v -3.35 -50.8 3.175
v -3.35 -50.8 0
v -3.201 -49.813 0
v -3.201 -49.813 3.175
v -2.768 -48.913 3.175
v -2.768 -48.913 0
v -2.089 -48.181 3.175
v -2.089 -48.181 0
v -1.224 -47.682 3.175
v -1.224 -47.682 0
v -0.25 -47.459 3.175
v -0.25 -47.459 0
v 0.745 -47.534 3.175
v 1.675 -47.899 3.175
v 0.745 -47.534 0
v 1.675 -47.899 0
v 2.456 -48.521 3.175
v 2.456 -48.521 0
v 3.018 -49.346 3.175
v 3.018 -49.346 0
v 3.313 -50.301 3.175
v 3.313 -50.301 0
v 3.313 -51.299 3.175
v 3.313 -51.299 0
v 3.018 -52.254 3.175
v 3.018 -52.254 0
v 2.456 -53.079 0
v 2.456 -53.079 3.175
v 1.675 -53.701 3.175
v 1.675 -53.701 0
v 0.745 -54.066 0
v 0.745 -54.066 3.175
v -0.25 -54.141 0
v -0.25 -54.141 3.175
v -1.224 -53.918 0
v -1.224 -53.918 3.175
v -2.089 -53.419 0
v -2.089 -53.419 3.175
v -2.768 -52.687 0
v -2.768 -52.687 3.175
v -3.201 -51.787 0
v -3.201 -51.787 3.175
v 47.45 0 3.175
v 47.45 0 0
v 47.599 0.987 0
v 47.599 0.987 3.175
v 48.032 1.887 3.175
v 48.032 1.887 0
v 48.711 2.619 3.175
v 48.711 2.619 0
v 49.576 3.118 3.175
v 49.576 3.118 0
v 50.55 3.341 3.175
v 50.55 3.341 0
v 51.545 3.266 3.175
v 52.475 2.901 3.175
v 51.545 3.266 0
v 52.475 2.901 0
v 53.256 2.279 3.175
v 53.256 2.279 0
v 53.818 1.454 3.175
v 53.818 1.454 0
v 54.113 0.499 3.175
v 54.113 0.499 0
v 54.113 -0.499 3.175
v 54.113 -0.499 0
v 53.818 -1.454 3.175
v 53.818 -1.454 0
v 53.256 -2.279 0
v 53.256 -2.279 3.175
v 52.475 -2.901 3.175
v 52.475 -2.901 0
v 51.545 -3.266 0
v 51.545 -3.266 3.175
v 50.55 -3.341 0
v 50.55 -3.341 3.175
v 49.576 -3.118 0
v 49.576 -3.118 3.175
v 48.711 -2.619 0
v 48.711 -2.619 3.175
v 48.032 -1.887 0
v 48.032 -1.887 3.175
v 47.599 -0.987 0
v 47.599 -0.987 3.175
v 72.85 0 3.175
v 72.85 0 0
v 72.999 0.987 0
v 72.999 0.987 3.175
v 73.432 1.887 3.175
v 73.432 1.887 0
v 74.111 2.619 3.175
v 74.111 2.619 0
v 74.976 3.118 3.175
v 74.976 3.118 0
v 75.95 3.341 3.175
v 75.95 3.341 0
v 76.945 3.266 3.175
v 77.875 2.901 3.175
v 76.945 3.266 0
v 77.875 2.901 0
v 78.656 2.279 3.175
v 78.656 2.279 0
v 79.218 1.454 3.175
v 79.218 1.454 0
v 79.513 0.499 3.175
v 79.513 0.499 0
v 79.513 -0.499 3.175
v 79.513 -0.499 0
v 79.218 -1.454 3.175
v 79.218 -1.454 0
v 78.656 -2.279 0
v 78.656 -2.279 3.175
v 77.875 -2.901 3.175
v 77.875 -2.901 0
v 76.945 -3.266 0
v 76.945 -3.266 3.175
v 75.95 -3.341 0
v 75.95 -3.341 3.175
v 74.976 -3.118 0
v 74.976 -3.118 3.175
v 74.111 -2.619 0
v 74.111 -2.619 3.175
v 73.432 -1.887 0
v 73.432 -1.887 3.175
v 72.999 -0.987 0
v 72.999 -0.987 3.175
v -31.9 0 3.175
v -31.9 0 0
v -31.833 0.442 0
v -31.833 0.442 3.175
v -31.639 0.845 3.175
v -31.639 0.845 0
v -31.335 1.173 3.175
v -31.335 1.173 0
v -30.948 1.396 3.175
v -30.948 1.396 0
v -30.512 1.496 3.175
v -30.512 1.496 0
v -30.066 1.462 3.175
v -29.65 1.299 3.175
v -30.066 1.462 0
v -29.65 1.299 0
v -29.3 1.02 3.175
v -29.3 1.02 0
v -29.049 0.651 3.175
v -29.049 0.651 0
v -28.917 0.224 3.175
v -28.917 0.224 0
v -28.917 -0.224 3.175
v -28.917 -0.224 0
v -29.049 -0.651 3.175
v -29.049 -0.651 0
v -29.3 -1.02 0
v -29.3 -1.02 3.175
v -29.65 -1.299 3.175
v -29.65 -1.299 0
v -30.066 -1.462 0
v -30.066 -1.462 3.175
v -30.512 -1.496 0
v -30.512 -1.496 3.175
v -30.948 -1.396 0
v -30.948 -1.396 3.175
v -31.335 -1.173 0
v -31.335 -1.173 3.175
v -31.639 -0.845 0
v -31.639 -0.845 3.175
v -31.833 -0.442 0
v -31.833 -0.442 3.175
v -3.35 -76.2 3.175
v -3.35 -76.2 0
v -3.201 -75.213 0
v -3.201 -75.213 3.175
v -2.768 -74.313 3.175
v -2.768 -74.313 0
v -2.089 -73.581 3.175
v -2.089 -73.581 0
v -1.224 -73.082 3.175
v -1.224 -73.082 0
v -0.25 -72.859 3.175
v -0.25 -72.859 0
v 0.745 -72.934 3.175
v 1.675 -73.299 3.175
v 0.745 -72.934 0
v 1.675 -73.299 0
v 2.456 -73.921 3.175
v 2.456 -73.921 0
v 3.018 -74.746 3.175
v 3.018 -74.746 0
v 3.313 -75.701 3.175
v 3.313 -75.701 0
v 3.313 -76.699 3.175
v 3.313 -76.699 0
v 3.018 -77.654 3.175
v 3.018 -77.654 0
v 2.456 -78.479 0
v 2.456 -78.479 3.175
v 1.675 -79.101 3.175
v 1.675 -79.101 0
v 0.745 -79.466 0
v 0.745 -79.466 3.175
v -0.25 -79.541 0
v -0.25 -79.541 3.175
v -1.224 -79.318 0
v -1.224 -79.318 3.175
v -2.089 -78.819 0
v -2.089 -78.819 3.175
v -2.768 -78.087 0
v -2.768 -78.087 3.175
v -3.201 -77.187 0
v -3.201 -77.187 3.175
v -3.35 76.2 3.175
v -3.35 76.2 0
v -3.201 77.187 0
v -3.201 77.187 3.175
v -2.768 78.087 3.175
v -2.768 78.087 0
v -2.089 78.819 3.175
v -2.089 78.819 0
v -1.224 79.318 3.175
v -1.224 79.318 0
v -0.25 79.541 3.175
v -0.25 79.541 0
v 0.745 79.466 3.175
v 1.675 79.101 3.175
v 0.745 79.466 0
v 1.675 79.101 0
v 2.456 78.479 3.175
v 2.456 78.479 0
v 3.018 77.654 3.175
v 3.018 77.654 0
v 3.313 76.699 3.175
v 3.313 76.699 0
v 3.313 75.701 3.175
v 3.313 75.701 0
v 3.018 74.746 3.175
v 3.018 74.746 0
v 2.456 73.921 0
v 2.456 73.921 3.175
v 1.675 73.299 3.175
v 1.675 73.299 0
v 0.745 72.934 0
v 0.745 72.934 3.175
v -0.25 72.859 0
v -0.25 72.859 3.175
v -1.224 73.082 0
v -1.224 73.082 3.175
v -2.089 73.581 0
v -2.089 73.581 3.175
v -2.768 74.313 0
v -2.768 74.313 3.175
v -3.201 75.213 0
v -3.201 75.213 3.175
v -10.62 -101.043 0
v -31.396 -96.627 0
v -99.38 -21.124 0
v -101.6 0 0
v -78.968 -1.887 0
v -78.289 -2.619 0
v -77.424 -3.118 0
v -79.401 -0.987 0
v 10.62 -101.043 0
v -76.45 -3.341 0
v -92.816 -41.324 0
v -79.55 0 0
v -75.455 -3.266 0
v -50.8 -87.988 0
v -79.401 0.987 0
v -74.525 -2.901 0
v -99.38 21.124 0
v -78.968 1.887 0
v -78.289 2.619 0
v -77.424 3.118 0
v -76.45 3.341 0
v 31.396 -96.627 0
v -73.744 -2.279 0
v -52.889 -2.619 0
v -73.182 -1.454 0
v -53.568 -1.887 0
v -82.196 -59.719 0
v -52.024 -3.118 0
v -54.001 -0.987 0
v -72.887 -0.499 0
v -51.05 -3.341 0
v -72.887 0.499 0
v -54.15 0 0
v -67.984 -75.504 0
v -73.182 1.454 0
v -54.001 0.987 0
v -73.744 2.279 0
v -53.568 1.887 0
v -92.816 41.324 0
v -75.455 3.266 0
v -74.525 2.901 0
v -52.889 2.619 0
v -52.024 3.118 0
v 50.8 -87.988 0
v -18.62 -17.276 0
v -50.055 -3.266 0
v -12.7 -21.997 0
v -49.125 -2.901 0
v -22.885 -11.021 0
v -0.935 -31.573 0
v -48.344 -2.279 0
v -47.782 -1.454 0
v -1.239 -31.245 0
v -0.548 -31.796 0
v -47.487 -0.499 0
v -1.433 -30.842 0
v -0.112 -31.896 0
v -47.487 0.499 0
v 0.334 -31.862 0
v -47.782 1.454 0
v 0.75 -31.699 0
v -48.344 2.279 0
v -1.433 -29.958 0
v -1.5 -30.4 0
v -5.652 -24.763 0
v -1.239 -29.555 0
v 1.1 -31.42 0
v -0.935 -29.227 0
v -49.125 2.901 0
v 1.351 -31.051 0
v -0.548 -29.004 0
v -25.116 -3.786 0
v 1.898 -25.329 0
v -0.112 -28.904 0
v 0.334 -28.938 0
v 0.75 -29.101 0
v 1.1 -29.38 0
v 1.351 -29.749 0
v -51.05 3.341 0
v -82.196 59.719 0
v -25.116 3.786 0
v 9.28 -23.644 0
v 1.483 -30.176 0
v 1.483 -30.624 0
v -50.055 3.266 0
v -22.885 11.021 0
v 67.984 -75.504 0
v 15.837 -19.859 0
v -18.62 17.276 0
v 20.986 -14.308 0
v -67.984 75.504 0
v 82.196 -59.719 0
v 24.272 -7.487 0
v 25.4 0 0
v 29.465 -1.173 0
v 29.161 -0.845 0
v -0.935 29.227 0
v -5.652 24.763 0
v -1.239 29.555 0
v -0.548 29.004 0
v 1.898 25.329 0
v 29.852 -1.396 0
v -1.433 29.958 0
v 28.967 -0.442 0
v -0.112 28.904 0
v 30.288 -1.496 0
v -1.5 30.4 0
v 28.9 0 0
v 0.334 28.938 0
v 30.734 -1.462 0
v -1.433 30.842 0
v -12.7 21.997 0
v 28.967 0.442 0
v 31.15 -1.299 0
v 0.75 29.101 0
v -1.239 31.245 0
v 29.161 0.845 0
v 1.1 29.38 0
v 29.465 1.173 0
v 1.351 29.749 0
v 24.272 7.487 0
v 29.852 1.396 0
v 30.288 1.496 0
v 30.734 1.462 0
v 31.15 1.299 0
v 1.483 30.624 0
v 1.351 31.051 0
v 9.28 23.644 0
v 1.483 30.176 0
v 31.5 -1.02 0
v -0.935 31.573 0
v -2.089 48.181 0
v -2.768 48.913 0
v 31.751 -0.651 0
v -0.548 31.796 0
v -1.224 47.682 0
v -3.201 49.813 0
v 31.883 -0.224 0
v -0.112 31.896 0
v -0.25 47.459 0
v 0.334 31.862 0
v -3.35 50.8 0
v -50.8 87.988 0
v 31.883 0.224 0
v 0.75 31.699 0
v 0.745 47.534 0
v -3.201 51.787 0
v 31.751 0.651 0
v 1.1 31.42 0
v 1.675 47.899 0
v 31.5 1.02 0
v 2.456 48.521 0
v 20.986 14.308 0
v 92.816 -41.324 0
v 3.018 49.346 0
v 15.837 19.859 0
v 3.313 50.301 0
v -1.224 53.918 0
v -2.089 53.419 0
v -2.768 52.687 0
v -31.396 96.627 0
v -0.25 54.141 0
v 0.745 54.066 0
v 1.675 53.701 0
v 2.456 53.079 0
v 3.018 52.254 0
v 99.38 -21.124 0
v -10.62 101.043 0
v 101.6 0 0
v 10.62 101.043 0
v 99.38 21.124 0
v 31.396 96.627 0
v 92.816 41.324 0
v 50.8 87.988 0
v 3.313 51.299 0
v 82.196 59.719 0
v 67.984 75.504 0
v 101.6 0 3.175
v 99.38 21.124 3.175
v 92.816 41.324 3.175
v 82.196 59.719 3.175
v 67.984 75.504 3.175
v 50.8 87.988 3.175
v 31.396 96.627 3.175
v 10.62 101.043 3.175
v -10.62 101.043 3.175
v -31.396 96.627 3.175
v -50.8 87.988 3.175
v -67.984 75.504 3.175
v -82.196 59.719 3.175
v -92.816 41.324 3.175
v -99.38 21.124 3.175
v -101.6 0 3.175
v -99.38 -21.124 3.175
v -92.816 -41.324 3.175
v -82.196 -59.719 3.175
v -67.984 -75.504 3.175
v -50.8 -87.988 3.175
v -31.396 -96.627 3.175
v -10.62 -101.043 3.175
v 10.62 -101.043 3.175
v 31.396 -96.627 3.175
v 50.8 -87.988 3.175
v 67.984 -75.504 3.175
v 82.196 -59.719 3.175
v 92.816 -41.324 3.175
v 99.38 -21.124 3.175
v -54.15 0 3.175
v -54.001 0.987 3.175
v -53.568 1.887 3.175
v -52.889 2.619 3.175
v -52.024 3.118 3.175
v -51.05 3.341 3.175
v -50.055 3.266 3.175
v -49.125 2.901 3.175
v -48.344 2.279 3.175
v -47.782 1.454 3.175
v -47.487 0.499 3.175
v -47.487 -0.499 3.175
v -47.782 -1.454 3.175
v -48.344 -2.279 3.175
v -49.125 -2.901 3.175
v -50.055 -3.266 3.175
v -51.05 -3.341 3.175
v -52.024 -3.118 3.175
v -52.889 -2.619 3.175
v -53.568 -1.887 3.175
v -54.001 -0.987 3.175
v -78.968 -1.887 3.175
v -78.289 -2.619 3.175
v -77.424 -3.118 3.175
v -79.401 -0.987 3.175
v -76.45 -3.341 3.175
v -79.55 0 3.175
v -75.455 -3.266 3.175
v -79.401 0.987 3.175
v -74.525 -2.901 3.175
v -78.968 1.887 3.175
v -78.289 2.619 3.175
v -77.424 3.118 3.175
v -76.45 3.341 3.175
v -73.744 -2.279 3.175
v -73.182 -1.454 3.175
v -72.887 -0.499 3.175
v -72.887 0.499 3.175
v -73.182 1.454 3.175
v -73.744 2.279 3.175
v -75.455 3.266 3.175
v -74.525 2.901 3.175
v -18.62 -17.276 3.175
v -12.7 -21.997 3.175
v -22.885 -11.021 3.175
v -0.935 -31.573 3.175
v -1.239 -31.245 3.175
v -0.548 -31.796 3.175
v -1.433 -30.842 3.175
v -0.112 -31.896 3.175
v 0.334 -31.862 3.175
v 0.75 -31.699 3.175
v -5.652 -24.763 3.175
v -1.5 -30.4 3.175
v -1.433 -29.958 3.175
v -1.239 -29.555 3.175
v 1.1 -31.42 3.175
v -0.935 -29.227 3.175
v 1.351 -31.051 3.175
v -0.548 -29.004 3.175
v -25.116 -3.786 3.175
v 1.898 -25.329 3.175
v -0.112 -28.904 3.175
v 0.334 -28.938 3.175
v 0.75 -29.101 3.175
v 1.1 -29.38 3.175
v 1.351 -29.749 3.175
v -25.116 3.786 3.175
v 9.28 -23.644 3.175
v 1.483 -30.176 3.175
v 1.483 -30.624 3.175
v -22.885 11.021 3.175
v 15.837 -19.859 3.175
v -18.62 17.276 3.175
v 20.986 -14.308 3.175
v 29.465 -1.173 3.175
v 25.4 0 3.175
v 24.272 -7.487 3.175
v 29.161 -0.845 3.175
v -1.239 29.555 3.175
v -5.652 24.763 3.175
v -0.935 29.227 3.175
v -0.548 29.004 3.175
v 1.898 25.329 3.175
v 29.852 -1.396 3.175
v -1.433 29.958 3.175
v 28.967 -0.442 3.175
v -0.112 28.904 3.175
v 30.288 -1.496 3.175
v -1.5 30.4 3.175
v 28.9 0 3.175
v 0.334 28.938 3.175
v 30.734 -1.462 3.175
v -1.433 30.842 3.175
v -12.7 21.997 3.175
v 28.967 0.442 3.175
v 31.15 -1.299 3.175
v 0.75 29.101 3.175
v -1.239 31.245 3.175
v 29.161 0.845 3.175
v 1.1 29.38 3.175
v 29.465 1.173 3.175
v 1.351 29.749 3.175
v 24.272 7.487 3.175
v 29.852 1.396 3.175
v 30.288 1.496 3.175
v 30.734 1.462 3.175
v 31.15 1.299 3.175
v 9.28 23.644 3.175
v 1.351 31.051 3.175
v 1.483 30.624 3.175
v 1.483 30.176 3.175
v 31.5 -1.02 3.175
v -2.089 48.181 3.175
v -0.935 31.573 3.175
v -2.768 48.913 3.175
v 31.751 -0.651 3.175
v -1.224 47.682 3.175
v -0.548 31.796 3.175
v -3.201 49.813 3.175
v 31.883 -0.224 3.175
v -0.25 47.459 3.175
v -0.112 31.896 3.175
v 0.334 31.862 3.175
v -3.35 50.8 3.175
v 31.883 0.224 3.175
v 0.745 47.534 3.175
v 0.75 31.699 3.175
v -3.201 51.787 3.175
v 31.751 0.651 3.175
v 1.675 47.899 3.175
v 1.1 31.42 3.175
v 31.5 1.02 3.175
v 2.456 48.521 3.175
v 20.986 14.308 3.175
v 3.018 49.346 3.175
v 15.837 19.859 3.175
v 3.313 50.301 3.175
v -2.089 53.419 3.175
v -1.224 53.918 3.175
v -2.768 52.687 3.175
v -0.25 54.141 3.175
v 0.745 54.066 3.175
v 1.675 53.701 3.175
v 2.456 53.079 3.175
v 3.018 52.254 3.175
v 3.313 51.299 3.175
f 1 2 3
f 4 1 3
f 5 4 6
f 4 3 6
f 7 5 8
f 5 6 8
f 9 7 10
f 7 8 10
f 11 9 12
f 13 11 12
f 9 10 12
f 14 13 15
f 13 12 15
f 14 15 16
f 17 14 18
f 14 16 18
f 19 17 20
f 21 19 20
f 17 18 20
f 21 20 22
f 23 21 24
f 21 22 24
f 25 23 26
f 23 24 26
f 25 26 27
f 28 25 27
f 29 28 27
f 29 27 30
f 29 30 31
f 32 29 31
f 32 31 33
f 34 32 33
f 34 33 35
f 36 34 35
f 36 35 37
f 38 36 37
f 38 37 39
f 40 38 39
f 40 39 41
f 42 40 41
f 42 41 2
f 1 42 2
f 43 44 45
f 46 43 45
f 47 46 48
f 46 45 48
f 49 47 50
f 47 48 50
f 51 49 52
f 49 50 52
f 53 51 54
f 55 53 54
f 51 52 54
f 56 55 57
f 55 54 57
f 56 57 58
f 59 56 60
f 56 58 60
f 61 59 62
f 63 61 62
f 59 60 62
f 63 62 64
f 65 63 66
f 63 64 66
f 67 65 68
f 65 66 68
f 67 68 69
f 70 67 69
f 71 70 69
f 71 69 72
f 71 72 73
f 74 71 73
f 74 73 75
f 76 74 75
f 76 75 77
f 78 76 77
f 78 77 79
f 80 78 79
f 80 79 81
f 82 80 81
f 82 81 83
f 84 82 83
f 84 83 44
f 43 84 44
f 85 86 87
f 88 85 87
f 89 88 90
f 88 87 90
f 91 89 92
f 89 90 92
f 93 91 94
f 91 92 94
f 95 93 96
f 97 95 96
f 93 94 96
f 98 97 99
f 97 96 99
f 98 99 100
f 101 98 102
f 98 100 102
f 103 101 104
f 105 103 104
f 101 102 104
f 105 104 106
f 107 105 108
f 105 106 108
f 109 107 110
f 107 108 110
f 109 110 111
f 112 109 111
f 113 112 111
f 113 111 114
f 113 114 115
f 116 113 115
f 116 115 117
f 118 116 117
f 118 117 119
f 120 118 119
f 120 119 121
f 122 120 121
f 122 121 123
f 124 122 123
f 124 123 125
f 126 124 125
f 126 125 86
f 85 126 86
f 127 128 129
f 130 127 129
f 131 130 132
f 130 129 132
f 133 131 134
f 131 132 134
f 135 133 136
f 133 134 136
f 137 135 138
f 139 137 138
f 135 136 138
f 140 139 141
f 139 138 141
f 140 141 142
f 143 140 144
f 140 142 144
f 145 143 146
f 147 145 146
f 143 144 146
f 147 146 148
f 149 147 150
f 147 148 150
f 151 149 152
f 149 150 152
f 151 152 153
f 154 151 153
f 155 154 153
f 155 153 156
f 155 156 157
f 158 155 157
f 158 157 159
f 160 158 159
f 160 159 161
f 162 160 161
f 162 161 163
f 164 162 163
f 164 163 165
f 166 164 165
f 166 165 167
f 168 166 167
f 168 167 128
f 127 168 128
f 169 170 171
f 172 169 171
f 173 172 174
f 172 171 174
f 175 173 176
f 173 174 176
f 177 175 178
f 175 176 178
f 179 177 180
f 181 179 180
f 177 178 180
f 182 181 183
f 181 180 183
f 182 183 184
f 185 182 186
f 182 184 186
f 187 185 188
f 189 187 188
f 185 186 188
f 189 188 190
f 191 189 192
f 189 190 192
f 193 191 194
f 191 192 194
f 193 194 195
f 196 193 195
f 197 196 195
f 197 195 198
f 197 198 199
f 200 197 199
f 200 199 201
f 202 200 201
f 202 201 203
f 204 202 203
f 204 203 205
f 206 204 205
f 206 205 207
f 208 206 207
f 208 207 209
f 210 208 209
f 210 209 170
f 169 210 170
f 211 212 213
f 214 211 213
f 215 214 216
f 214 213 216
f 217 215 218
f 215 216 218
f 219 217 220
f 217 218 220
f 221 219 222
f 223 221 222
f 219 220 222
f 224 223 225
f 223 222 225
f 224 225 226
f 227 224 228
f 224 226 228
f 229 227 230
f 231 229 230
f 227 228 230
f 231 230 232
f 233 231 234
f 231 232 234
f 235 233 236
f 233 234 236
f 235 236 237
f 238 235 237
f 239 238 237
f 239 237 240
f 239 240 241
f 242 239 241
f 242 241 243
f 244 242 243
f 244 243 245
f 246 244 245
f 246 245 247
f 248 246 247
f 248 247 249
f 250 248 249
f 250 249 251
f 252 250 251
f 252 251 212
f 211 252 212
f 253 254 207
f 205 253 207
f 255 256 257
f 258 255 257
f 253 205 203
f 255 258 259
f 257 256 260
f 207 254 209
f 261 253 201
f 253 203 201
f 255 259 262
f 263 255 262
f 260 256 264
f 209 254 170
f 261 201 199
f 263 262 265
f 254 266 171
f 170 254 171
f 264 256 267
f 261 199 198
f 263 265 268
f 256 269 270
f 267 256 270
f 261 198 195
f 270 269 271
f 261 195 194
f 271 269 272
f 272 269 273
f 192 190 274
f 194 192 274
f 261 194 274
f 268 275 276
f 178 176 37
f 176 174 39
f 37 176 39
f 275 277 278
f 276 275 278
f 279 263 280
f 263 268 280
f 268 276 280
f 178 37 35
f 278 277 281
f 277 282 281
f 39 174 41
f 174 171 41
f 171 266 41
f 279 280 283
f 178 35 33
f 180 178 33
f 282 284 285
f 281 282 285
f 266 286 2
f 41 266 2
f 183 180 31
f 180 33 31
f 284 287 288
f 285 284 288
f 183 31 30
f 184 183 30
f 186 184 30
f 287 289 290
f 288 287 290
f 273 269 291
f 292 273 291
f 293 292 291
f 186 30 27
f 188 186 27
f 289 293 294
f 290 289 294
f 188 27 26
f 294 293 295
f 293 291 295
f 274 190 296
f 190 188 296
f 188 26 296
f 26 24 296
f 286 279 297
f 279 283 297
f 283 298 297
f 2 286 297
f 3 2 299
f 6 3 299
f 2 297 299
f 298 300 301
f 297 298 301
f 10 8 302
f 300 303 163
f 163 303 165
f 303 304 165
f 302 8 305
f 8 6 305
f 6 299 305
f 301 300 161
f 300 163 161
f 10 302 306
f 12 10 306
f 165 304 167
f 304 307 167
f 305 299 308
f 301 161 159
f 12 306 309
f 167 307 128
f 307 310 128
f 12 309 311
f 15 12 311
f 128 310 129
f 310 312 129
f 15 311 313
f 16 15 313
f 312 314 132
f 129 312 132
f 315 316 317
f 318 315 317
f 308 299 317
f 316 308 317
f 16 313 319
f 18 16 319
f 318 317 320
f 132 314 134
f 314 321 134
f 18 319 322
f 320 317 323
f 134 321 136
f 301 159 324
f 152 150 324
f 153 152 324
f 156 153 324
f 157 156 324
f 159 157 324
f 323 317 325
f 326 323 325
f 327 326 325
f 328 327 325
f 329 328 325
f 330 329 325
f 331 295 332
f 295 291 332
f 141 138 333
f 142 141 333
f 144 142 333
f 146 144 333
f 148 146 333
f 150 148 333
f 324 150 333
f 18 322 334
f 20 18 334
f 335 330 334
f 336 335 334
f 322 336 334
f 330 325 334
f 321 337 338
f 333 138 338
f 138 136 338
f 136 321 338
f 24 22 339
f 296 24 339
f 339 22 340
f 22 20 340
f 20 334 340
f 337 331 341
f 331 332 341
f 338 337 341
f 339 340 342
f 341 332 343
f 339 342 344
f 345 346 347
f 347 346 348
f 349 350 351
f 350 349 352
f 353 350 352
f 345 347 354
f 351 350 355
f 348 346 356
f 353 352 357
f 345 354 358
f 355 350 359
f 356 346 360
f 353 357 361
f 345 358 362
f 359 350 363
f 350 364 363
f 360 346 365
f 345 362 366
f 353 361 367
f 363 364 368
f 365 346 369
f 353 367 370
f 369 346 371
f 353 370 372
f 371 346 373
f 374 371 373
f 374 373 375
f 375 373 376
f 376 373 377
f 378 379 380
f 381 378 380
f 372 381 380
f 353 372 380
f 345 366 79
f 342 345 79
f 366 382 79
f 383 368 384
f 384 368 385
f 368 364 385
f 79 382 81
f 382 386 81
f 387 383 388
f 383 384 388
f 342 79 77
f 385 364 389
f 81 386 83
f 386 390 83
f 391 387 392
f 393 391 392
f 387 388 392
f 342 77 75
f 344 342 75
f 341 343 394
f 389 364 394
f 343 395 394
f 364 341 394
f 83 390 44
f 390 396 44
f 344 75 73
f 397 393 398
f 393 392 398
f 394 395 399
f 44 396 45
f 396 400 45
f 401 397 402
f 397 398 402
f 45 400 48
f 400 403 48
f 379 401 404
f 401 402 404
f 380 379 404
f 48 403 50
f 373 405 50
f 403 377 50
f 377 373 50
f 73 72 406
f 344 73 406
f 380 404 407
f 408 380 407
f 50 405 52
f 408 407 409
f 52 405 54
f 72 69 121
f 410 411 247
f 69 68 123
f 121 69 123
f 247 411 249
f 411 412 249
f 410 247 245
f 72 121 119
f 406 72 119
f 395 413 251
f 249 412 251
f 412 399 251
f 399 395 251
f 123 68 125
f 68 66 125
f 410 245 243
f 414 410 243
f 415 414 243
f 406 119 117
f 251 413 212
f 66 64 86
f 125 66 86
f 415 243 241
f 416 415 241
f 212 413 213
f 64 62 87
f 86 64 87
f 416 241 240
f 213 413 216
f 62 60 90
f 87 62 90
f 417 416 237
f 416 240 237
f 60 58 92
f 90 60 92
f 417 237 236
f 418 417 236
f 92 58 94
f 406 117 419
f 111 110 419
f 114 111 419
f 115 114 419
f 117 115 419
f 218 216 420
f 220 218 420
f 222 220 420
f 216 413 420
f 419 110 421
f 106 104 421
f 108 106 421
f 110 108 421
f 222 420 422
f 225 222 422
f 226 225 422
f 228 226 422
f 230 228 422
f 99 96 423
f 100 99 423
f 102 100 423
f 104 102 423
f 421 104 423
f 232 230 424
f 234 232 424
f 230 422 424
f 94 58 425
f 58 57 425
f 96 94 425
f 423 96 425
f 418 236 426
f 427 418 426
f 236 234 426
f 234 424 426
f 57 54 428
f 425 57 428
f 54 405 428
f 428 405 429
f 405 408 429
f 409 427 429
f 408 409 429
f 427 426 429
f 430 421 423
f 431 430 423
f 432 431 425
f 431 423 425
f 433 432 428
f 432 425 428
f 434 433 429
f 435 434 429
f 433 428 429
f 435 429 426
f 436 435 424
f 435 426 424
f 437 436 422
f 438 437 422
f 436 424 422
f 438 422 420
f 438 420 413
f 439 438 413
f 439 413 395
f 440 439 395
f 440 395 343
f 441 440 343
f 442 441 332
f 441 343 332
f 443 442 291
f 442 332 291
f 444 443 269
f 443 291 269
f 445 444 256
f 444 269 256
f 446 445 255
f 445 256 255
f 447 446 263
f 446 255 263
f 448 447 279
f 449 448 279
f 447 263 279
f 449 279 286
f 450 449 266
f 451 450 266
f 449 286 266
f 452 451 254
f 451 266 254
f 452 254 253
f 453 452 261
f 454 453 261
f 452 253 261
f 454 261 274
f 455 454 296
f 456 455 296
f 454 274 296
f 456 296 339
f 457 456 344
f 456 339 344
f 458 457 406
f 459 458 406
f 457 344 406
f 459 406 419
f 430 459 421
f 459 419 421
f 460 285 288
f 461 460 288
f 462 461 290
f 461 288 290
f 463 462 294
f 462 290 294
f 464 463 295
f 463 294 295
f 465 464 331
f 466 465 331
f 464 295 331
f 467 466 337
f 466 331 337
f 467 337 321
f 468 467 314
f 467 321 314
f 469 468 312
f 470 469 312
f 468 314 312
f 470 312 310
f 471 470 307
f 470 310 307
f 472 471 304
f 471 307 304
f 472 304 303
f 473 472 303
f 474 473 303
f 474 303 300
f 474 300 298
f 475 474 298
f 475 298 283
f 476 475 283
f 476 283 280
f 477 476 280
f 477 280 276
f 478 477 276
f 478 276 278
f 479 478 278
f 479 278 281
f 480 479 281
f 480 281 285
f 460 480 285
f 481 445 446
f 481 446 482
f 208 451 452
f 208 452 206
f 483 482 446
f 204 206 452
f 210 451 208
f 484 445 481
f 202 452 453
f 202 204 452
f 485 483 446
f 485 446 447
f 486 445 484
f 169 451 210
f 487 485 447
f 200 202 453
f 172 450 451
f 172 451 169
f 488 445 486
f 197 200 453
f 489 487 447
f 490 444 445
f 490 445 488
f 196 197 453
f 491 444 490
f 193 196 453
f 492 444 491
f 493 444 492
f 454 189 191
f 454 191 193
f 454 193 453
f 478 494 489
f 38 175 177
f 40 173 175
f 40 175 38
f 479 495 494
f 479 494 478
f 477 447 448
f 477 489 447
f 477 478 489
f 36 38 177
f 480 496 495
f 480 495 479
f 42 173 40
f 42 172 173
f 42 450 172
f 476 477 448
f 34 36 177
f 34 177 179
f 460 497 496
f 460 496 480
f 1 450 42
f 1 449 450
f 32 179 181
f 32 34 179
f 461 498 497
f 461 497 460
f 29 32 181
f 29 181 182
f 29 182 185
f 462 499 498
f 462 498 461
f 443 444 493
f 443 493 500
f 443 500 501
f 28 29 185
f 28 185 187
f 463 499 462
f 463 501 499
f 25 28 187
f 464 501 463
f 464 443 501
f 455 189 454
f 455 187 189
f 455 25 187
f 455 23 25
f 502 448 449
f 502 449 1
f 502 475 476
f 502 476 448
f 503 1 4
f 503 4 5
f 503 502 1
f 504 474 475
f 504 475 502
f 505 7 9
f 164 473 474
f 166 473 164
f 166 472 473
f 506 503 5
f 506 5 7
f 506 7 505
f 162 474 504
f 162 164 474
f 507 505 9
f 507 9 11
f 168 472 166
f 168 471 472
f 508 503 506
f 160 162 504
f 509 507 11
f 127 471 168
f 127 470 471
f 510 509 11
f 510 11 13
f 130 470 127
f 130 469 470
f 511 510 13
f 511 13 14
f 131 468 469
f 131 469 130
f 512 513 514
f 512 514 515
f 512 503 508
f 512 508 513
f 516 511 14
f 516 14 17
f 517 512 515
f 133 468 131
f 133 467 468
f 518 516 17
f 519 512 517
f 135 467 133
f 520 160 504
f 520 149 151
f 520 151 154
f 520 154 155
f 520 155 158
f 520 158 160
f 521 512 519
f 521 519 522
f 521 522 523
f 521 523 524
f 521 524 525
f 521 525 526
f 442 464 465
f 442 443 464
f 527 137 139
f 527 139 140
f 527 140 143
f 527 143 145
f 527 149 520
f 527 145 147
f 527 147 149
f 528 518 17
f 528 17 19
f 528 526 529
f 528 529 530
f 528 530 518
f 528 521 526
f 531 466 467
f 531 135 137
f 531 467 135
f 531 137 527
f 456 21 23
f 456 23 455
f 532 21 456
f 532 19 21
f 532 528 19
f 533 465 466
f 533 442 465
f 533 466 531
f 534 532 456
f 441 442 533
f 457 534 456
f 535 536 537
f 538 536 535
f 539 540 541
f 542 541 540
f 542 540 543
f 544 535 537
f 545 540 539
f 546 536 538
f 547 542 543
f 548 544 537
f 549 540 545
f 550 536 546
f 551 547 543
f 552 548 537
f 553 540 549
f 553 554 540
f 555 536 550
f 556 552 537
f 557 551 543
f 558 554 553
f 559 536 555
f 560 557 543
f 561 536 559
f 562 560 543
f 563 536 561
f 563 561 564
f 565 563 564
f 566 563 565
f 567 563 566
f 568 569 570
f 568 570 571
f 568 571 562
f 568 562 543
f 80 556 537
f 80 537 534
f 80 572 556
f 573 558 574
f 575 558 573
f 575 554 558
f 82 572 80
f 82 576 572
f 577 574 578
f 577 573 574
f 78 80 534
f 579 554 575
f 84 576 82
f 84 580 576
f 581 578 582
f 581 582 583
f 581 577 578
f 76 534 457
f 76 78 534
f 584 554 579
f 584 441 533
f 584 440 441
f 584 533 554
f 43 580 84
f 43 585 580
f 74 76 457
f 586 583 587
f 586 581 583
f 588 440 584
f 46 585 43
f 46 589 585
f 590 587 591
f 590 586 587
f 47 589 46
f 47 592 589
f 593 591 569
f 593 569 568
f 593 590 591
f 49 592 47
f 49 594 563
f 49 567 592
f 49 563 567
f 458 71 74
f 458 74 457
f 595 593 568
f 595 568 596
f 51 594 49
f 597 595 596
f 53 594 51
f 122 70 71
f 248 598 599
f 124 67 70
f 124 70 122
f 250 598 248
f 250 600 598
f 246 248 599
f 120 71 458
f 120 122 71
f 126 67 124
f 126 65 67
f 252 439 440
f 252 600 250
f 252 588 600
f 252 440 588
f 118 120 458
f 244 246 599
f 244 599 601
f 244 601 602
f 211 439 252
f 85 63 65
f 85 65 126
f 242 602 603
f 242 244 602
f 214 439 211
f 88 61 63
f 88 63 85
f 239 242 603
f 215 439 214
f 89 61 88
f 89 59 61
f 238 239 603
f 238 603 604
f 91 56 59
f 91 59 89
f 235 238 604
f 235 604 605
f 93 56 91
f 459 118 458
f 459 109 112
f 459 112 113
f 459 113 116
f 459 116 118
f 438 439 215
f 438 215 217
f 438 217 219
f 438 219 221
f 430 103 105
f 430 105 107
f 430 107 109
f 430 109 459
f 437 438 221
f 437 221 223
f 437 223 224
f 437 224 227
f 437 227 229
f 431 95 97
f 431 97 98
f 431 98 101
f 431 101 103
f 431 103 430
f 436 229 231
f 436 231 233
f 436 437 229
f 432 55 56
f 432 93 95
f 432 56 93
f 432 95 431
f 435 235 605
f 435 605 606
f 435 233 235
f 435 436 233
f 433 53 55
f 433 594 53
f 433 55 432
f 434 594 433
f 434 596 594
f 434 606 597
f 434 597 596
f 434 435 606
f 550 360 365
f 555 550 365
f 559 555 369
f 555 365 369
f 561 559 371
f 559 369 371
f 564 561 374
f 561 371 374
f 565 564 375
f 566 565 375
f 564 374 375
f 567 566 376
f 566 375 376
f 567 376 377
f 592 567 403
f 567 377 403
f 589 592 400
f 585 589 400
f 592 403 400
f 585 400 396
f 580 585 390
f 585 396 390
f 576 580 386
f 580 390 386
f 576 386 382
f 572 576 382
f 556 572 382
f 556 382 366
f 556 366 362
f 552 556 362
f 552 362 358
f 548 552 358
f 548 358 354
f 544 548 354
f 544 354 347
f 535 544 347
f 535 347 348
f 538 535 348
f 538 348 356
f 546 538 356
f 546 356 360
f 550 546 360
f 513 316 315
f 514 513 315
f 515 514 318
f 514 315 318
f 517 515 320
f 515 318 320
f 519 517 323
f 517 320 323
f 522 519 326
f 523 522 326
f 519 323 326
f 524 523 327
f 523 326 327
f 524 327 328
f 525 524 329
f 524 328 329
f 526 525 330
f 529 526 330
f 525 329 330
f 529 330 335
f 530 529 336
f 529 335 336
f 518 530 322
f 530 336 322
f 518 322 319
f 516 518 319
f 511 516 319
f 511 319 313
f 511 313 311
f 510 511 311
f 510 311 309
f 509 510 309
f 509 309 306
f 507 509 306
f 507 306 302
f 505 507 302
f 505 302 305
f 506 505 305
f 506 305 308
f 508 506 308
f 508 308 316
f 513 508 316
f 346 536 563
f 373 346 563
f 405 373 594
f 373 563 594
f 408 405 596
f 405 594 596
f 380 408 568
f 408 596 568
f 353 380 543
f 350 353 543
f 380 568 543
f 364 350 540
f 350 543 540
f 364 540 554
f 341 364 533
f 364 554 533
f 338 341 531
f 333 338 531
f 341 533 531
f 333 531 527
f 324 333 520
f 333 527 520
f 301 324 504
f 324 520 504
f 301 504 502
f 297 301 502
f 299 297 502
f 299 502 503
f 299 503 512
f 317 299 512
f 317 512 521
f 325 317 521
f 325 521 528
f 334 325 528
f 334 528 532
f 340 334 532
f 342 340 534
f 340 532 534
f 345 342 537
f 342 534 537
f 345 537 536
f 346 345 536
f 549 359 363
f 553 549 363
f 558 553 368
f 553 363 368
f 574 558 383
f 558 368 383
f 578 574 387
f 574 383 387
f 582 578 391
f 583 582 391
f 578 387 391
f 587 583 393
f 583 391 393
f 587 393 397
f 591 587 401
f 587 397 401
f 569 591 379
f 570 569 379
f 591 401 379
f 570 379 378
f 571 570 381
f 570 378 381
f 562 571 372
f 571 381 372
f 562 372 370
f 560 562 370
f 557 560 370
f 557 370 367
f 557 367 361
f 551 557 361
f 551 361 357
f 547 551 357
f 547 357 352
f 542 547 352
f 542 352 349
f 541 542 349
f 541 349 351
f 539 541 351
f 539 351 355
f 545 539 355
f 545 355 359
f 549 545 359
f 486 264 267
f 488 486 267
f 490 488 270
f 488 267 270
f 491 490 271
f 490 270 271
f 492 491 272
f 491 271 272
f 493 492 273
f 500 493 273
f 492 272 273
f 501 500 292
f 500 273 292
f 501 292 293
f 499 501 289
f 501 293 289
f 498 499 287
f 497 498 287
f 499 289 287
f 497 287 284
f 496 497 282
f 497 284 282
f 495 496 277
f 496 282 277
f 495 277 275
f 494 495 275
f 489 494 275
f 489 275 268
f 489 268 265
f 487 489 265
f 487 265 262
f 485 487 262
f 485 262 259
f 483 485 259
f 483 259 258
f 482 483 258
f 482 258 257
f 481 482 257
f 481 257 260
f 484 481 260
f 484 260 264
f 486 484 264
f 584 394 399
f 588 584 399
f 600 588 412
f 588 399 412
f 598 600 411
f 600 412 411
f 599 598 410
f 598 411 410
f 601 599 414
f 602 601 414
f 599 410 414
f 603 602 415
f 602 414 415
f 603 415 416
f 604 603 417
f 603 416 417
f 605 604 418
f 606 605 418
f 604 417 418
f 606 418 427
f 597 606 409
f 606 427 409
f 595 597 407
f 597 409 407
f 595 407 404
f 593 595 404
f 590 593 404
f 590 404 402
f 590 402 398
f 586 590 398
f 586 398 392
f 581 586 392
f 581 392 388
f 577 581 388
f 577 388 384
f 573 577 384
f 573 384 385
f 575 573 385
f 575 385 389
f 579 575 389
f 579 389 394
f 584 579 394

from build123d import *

# Parameters (mm, degrees)
SKETCH1_R           = 101.6
BOSS_EXTRUDE1_DEPTH = 3.175
SKETCH2_R           = 25.4
CUT_EXTRUDE1_DEPTH  = 3.175
SKETCH4_R           = 1.5
CUT_EXTRUDE3_DEPTH  = 10
SKETCH5_R           = 3.35
CUT_EXTRUDE4_DEPTH  = 10
SKETCH6_R           = 3.35
CUT_EXTRUDE5_DEPTH  = 10


with BuildPart() as part:
    # Sketch1 → Boss-Extrude1 (new body)
    with BuildSketch(Plane.XY):
        Circle(SKETCH1_R)
    extrude(amount=BOSS_EXTRUDE1_DEPTH)

    # Sketch2 → Cut-Extrude1 (cut)
    with BuildSketch(Plane.XY.offset(3.175)):
        Circle(SKETCH2_R)
    extrude(amount=-CUT_EXTRUDE1_DEPTH, mode=Mode.SUBTRACT)

    # Sketch4 → Cut-Extrude3 (cut)
    with BuildSketch(Plane(origin=(0, 0, 0), x_dir=(-1, 0, 0), z_dir=(0, 0, -1))):
        with Locations((0, 30.399999906)):
            Circle(SKETCH4_R)
        with Locations((30.399999906, 0)):
            Circle(SKETCH4_R)
        with Locations((0, -30.399999906)):
            Circle(SKETCH4_R)
        with Locations((-30.399999906, 0)):
            Circle(SKETCH4_R)
    extrude(amount=-CUT_EXTRUDE3_DEPTH, mode=Mode.SUBTRACT)

    # Sketch5 → Cut-Extrude4 (cut)
    with BuildSketch(Plane(origin=(0, 0, 0), x_dir=(-1, 0, 0), z_dir=(0, 0, -1))):
        with Locations((0, 50.8)):
            Circle(SKETCH5_R)
        with Locations((50.8, 0)):
            Circle(SKETCH5_R)
        with Locations((0, -50.8)):
            Circle(SKETCH5_R)
        with Locations((-50.8, 0)):
            Circle(SKETCH5_R)
    extrude(amount=-CUT_EXTRUDE4_DEPTH, mode=Mode.SUBTRACT)

    # Sketch6 → Cut-Extrude5 (cut)
    with BuildSketch(Plane(origin=(0, 0, 0), x_dir=(-1, 0, 0), z_dir=(0, 0, -1))):
        with Locations((-76.2, 0)):
            Circle(SKETCH6_R)
        with Locations((0, 76.2)):
            Circle(SKETCH6_R)
        with Locations((0, -76.2)):
            Circle(SKETCH6_R)
        with Locations((76.2, 0)):
            Circle(SKETCH6_R)
    extrude(amount=-CUT_EXTRUDE5_DEPTH, mode=Mode.SUBTRACT)


solid = part.part
